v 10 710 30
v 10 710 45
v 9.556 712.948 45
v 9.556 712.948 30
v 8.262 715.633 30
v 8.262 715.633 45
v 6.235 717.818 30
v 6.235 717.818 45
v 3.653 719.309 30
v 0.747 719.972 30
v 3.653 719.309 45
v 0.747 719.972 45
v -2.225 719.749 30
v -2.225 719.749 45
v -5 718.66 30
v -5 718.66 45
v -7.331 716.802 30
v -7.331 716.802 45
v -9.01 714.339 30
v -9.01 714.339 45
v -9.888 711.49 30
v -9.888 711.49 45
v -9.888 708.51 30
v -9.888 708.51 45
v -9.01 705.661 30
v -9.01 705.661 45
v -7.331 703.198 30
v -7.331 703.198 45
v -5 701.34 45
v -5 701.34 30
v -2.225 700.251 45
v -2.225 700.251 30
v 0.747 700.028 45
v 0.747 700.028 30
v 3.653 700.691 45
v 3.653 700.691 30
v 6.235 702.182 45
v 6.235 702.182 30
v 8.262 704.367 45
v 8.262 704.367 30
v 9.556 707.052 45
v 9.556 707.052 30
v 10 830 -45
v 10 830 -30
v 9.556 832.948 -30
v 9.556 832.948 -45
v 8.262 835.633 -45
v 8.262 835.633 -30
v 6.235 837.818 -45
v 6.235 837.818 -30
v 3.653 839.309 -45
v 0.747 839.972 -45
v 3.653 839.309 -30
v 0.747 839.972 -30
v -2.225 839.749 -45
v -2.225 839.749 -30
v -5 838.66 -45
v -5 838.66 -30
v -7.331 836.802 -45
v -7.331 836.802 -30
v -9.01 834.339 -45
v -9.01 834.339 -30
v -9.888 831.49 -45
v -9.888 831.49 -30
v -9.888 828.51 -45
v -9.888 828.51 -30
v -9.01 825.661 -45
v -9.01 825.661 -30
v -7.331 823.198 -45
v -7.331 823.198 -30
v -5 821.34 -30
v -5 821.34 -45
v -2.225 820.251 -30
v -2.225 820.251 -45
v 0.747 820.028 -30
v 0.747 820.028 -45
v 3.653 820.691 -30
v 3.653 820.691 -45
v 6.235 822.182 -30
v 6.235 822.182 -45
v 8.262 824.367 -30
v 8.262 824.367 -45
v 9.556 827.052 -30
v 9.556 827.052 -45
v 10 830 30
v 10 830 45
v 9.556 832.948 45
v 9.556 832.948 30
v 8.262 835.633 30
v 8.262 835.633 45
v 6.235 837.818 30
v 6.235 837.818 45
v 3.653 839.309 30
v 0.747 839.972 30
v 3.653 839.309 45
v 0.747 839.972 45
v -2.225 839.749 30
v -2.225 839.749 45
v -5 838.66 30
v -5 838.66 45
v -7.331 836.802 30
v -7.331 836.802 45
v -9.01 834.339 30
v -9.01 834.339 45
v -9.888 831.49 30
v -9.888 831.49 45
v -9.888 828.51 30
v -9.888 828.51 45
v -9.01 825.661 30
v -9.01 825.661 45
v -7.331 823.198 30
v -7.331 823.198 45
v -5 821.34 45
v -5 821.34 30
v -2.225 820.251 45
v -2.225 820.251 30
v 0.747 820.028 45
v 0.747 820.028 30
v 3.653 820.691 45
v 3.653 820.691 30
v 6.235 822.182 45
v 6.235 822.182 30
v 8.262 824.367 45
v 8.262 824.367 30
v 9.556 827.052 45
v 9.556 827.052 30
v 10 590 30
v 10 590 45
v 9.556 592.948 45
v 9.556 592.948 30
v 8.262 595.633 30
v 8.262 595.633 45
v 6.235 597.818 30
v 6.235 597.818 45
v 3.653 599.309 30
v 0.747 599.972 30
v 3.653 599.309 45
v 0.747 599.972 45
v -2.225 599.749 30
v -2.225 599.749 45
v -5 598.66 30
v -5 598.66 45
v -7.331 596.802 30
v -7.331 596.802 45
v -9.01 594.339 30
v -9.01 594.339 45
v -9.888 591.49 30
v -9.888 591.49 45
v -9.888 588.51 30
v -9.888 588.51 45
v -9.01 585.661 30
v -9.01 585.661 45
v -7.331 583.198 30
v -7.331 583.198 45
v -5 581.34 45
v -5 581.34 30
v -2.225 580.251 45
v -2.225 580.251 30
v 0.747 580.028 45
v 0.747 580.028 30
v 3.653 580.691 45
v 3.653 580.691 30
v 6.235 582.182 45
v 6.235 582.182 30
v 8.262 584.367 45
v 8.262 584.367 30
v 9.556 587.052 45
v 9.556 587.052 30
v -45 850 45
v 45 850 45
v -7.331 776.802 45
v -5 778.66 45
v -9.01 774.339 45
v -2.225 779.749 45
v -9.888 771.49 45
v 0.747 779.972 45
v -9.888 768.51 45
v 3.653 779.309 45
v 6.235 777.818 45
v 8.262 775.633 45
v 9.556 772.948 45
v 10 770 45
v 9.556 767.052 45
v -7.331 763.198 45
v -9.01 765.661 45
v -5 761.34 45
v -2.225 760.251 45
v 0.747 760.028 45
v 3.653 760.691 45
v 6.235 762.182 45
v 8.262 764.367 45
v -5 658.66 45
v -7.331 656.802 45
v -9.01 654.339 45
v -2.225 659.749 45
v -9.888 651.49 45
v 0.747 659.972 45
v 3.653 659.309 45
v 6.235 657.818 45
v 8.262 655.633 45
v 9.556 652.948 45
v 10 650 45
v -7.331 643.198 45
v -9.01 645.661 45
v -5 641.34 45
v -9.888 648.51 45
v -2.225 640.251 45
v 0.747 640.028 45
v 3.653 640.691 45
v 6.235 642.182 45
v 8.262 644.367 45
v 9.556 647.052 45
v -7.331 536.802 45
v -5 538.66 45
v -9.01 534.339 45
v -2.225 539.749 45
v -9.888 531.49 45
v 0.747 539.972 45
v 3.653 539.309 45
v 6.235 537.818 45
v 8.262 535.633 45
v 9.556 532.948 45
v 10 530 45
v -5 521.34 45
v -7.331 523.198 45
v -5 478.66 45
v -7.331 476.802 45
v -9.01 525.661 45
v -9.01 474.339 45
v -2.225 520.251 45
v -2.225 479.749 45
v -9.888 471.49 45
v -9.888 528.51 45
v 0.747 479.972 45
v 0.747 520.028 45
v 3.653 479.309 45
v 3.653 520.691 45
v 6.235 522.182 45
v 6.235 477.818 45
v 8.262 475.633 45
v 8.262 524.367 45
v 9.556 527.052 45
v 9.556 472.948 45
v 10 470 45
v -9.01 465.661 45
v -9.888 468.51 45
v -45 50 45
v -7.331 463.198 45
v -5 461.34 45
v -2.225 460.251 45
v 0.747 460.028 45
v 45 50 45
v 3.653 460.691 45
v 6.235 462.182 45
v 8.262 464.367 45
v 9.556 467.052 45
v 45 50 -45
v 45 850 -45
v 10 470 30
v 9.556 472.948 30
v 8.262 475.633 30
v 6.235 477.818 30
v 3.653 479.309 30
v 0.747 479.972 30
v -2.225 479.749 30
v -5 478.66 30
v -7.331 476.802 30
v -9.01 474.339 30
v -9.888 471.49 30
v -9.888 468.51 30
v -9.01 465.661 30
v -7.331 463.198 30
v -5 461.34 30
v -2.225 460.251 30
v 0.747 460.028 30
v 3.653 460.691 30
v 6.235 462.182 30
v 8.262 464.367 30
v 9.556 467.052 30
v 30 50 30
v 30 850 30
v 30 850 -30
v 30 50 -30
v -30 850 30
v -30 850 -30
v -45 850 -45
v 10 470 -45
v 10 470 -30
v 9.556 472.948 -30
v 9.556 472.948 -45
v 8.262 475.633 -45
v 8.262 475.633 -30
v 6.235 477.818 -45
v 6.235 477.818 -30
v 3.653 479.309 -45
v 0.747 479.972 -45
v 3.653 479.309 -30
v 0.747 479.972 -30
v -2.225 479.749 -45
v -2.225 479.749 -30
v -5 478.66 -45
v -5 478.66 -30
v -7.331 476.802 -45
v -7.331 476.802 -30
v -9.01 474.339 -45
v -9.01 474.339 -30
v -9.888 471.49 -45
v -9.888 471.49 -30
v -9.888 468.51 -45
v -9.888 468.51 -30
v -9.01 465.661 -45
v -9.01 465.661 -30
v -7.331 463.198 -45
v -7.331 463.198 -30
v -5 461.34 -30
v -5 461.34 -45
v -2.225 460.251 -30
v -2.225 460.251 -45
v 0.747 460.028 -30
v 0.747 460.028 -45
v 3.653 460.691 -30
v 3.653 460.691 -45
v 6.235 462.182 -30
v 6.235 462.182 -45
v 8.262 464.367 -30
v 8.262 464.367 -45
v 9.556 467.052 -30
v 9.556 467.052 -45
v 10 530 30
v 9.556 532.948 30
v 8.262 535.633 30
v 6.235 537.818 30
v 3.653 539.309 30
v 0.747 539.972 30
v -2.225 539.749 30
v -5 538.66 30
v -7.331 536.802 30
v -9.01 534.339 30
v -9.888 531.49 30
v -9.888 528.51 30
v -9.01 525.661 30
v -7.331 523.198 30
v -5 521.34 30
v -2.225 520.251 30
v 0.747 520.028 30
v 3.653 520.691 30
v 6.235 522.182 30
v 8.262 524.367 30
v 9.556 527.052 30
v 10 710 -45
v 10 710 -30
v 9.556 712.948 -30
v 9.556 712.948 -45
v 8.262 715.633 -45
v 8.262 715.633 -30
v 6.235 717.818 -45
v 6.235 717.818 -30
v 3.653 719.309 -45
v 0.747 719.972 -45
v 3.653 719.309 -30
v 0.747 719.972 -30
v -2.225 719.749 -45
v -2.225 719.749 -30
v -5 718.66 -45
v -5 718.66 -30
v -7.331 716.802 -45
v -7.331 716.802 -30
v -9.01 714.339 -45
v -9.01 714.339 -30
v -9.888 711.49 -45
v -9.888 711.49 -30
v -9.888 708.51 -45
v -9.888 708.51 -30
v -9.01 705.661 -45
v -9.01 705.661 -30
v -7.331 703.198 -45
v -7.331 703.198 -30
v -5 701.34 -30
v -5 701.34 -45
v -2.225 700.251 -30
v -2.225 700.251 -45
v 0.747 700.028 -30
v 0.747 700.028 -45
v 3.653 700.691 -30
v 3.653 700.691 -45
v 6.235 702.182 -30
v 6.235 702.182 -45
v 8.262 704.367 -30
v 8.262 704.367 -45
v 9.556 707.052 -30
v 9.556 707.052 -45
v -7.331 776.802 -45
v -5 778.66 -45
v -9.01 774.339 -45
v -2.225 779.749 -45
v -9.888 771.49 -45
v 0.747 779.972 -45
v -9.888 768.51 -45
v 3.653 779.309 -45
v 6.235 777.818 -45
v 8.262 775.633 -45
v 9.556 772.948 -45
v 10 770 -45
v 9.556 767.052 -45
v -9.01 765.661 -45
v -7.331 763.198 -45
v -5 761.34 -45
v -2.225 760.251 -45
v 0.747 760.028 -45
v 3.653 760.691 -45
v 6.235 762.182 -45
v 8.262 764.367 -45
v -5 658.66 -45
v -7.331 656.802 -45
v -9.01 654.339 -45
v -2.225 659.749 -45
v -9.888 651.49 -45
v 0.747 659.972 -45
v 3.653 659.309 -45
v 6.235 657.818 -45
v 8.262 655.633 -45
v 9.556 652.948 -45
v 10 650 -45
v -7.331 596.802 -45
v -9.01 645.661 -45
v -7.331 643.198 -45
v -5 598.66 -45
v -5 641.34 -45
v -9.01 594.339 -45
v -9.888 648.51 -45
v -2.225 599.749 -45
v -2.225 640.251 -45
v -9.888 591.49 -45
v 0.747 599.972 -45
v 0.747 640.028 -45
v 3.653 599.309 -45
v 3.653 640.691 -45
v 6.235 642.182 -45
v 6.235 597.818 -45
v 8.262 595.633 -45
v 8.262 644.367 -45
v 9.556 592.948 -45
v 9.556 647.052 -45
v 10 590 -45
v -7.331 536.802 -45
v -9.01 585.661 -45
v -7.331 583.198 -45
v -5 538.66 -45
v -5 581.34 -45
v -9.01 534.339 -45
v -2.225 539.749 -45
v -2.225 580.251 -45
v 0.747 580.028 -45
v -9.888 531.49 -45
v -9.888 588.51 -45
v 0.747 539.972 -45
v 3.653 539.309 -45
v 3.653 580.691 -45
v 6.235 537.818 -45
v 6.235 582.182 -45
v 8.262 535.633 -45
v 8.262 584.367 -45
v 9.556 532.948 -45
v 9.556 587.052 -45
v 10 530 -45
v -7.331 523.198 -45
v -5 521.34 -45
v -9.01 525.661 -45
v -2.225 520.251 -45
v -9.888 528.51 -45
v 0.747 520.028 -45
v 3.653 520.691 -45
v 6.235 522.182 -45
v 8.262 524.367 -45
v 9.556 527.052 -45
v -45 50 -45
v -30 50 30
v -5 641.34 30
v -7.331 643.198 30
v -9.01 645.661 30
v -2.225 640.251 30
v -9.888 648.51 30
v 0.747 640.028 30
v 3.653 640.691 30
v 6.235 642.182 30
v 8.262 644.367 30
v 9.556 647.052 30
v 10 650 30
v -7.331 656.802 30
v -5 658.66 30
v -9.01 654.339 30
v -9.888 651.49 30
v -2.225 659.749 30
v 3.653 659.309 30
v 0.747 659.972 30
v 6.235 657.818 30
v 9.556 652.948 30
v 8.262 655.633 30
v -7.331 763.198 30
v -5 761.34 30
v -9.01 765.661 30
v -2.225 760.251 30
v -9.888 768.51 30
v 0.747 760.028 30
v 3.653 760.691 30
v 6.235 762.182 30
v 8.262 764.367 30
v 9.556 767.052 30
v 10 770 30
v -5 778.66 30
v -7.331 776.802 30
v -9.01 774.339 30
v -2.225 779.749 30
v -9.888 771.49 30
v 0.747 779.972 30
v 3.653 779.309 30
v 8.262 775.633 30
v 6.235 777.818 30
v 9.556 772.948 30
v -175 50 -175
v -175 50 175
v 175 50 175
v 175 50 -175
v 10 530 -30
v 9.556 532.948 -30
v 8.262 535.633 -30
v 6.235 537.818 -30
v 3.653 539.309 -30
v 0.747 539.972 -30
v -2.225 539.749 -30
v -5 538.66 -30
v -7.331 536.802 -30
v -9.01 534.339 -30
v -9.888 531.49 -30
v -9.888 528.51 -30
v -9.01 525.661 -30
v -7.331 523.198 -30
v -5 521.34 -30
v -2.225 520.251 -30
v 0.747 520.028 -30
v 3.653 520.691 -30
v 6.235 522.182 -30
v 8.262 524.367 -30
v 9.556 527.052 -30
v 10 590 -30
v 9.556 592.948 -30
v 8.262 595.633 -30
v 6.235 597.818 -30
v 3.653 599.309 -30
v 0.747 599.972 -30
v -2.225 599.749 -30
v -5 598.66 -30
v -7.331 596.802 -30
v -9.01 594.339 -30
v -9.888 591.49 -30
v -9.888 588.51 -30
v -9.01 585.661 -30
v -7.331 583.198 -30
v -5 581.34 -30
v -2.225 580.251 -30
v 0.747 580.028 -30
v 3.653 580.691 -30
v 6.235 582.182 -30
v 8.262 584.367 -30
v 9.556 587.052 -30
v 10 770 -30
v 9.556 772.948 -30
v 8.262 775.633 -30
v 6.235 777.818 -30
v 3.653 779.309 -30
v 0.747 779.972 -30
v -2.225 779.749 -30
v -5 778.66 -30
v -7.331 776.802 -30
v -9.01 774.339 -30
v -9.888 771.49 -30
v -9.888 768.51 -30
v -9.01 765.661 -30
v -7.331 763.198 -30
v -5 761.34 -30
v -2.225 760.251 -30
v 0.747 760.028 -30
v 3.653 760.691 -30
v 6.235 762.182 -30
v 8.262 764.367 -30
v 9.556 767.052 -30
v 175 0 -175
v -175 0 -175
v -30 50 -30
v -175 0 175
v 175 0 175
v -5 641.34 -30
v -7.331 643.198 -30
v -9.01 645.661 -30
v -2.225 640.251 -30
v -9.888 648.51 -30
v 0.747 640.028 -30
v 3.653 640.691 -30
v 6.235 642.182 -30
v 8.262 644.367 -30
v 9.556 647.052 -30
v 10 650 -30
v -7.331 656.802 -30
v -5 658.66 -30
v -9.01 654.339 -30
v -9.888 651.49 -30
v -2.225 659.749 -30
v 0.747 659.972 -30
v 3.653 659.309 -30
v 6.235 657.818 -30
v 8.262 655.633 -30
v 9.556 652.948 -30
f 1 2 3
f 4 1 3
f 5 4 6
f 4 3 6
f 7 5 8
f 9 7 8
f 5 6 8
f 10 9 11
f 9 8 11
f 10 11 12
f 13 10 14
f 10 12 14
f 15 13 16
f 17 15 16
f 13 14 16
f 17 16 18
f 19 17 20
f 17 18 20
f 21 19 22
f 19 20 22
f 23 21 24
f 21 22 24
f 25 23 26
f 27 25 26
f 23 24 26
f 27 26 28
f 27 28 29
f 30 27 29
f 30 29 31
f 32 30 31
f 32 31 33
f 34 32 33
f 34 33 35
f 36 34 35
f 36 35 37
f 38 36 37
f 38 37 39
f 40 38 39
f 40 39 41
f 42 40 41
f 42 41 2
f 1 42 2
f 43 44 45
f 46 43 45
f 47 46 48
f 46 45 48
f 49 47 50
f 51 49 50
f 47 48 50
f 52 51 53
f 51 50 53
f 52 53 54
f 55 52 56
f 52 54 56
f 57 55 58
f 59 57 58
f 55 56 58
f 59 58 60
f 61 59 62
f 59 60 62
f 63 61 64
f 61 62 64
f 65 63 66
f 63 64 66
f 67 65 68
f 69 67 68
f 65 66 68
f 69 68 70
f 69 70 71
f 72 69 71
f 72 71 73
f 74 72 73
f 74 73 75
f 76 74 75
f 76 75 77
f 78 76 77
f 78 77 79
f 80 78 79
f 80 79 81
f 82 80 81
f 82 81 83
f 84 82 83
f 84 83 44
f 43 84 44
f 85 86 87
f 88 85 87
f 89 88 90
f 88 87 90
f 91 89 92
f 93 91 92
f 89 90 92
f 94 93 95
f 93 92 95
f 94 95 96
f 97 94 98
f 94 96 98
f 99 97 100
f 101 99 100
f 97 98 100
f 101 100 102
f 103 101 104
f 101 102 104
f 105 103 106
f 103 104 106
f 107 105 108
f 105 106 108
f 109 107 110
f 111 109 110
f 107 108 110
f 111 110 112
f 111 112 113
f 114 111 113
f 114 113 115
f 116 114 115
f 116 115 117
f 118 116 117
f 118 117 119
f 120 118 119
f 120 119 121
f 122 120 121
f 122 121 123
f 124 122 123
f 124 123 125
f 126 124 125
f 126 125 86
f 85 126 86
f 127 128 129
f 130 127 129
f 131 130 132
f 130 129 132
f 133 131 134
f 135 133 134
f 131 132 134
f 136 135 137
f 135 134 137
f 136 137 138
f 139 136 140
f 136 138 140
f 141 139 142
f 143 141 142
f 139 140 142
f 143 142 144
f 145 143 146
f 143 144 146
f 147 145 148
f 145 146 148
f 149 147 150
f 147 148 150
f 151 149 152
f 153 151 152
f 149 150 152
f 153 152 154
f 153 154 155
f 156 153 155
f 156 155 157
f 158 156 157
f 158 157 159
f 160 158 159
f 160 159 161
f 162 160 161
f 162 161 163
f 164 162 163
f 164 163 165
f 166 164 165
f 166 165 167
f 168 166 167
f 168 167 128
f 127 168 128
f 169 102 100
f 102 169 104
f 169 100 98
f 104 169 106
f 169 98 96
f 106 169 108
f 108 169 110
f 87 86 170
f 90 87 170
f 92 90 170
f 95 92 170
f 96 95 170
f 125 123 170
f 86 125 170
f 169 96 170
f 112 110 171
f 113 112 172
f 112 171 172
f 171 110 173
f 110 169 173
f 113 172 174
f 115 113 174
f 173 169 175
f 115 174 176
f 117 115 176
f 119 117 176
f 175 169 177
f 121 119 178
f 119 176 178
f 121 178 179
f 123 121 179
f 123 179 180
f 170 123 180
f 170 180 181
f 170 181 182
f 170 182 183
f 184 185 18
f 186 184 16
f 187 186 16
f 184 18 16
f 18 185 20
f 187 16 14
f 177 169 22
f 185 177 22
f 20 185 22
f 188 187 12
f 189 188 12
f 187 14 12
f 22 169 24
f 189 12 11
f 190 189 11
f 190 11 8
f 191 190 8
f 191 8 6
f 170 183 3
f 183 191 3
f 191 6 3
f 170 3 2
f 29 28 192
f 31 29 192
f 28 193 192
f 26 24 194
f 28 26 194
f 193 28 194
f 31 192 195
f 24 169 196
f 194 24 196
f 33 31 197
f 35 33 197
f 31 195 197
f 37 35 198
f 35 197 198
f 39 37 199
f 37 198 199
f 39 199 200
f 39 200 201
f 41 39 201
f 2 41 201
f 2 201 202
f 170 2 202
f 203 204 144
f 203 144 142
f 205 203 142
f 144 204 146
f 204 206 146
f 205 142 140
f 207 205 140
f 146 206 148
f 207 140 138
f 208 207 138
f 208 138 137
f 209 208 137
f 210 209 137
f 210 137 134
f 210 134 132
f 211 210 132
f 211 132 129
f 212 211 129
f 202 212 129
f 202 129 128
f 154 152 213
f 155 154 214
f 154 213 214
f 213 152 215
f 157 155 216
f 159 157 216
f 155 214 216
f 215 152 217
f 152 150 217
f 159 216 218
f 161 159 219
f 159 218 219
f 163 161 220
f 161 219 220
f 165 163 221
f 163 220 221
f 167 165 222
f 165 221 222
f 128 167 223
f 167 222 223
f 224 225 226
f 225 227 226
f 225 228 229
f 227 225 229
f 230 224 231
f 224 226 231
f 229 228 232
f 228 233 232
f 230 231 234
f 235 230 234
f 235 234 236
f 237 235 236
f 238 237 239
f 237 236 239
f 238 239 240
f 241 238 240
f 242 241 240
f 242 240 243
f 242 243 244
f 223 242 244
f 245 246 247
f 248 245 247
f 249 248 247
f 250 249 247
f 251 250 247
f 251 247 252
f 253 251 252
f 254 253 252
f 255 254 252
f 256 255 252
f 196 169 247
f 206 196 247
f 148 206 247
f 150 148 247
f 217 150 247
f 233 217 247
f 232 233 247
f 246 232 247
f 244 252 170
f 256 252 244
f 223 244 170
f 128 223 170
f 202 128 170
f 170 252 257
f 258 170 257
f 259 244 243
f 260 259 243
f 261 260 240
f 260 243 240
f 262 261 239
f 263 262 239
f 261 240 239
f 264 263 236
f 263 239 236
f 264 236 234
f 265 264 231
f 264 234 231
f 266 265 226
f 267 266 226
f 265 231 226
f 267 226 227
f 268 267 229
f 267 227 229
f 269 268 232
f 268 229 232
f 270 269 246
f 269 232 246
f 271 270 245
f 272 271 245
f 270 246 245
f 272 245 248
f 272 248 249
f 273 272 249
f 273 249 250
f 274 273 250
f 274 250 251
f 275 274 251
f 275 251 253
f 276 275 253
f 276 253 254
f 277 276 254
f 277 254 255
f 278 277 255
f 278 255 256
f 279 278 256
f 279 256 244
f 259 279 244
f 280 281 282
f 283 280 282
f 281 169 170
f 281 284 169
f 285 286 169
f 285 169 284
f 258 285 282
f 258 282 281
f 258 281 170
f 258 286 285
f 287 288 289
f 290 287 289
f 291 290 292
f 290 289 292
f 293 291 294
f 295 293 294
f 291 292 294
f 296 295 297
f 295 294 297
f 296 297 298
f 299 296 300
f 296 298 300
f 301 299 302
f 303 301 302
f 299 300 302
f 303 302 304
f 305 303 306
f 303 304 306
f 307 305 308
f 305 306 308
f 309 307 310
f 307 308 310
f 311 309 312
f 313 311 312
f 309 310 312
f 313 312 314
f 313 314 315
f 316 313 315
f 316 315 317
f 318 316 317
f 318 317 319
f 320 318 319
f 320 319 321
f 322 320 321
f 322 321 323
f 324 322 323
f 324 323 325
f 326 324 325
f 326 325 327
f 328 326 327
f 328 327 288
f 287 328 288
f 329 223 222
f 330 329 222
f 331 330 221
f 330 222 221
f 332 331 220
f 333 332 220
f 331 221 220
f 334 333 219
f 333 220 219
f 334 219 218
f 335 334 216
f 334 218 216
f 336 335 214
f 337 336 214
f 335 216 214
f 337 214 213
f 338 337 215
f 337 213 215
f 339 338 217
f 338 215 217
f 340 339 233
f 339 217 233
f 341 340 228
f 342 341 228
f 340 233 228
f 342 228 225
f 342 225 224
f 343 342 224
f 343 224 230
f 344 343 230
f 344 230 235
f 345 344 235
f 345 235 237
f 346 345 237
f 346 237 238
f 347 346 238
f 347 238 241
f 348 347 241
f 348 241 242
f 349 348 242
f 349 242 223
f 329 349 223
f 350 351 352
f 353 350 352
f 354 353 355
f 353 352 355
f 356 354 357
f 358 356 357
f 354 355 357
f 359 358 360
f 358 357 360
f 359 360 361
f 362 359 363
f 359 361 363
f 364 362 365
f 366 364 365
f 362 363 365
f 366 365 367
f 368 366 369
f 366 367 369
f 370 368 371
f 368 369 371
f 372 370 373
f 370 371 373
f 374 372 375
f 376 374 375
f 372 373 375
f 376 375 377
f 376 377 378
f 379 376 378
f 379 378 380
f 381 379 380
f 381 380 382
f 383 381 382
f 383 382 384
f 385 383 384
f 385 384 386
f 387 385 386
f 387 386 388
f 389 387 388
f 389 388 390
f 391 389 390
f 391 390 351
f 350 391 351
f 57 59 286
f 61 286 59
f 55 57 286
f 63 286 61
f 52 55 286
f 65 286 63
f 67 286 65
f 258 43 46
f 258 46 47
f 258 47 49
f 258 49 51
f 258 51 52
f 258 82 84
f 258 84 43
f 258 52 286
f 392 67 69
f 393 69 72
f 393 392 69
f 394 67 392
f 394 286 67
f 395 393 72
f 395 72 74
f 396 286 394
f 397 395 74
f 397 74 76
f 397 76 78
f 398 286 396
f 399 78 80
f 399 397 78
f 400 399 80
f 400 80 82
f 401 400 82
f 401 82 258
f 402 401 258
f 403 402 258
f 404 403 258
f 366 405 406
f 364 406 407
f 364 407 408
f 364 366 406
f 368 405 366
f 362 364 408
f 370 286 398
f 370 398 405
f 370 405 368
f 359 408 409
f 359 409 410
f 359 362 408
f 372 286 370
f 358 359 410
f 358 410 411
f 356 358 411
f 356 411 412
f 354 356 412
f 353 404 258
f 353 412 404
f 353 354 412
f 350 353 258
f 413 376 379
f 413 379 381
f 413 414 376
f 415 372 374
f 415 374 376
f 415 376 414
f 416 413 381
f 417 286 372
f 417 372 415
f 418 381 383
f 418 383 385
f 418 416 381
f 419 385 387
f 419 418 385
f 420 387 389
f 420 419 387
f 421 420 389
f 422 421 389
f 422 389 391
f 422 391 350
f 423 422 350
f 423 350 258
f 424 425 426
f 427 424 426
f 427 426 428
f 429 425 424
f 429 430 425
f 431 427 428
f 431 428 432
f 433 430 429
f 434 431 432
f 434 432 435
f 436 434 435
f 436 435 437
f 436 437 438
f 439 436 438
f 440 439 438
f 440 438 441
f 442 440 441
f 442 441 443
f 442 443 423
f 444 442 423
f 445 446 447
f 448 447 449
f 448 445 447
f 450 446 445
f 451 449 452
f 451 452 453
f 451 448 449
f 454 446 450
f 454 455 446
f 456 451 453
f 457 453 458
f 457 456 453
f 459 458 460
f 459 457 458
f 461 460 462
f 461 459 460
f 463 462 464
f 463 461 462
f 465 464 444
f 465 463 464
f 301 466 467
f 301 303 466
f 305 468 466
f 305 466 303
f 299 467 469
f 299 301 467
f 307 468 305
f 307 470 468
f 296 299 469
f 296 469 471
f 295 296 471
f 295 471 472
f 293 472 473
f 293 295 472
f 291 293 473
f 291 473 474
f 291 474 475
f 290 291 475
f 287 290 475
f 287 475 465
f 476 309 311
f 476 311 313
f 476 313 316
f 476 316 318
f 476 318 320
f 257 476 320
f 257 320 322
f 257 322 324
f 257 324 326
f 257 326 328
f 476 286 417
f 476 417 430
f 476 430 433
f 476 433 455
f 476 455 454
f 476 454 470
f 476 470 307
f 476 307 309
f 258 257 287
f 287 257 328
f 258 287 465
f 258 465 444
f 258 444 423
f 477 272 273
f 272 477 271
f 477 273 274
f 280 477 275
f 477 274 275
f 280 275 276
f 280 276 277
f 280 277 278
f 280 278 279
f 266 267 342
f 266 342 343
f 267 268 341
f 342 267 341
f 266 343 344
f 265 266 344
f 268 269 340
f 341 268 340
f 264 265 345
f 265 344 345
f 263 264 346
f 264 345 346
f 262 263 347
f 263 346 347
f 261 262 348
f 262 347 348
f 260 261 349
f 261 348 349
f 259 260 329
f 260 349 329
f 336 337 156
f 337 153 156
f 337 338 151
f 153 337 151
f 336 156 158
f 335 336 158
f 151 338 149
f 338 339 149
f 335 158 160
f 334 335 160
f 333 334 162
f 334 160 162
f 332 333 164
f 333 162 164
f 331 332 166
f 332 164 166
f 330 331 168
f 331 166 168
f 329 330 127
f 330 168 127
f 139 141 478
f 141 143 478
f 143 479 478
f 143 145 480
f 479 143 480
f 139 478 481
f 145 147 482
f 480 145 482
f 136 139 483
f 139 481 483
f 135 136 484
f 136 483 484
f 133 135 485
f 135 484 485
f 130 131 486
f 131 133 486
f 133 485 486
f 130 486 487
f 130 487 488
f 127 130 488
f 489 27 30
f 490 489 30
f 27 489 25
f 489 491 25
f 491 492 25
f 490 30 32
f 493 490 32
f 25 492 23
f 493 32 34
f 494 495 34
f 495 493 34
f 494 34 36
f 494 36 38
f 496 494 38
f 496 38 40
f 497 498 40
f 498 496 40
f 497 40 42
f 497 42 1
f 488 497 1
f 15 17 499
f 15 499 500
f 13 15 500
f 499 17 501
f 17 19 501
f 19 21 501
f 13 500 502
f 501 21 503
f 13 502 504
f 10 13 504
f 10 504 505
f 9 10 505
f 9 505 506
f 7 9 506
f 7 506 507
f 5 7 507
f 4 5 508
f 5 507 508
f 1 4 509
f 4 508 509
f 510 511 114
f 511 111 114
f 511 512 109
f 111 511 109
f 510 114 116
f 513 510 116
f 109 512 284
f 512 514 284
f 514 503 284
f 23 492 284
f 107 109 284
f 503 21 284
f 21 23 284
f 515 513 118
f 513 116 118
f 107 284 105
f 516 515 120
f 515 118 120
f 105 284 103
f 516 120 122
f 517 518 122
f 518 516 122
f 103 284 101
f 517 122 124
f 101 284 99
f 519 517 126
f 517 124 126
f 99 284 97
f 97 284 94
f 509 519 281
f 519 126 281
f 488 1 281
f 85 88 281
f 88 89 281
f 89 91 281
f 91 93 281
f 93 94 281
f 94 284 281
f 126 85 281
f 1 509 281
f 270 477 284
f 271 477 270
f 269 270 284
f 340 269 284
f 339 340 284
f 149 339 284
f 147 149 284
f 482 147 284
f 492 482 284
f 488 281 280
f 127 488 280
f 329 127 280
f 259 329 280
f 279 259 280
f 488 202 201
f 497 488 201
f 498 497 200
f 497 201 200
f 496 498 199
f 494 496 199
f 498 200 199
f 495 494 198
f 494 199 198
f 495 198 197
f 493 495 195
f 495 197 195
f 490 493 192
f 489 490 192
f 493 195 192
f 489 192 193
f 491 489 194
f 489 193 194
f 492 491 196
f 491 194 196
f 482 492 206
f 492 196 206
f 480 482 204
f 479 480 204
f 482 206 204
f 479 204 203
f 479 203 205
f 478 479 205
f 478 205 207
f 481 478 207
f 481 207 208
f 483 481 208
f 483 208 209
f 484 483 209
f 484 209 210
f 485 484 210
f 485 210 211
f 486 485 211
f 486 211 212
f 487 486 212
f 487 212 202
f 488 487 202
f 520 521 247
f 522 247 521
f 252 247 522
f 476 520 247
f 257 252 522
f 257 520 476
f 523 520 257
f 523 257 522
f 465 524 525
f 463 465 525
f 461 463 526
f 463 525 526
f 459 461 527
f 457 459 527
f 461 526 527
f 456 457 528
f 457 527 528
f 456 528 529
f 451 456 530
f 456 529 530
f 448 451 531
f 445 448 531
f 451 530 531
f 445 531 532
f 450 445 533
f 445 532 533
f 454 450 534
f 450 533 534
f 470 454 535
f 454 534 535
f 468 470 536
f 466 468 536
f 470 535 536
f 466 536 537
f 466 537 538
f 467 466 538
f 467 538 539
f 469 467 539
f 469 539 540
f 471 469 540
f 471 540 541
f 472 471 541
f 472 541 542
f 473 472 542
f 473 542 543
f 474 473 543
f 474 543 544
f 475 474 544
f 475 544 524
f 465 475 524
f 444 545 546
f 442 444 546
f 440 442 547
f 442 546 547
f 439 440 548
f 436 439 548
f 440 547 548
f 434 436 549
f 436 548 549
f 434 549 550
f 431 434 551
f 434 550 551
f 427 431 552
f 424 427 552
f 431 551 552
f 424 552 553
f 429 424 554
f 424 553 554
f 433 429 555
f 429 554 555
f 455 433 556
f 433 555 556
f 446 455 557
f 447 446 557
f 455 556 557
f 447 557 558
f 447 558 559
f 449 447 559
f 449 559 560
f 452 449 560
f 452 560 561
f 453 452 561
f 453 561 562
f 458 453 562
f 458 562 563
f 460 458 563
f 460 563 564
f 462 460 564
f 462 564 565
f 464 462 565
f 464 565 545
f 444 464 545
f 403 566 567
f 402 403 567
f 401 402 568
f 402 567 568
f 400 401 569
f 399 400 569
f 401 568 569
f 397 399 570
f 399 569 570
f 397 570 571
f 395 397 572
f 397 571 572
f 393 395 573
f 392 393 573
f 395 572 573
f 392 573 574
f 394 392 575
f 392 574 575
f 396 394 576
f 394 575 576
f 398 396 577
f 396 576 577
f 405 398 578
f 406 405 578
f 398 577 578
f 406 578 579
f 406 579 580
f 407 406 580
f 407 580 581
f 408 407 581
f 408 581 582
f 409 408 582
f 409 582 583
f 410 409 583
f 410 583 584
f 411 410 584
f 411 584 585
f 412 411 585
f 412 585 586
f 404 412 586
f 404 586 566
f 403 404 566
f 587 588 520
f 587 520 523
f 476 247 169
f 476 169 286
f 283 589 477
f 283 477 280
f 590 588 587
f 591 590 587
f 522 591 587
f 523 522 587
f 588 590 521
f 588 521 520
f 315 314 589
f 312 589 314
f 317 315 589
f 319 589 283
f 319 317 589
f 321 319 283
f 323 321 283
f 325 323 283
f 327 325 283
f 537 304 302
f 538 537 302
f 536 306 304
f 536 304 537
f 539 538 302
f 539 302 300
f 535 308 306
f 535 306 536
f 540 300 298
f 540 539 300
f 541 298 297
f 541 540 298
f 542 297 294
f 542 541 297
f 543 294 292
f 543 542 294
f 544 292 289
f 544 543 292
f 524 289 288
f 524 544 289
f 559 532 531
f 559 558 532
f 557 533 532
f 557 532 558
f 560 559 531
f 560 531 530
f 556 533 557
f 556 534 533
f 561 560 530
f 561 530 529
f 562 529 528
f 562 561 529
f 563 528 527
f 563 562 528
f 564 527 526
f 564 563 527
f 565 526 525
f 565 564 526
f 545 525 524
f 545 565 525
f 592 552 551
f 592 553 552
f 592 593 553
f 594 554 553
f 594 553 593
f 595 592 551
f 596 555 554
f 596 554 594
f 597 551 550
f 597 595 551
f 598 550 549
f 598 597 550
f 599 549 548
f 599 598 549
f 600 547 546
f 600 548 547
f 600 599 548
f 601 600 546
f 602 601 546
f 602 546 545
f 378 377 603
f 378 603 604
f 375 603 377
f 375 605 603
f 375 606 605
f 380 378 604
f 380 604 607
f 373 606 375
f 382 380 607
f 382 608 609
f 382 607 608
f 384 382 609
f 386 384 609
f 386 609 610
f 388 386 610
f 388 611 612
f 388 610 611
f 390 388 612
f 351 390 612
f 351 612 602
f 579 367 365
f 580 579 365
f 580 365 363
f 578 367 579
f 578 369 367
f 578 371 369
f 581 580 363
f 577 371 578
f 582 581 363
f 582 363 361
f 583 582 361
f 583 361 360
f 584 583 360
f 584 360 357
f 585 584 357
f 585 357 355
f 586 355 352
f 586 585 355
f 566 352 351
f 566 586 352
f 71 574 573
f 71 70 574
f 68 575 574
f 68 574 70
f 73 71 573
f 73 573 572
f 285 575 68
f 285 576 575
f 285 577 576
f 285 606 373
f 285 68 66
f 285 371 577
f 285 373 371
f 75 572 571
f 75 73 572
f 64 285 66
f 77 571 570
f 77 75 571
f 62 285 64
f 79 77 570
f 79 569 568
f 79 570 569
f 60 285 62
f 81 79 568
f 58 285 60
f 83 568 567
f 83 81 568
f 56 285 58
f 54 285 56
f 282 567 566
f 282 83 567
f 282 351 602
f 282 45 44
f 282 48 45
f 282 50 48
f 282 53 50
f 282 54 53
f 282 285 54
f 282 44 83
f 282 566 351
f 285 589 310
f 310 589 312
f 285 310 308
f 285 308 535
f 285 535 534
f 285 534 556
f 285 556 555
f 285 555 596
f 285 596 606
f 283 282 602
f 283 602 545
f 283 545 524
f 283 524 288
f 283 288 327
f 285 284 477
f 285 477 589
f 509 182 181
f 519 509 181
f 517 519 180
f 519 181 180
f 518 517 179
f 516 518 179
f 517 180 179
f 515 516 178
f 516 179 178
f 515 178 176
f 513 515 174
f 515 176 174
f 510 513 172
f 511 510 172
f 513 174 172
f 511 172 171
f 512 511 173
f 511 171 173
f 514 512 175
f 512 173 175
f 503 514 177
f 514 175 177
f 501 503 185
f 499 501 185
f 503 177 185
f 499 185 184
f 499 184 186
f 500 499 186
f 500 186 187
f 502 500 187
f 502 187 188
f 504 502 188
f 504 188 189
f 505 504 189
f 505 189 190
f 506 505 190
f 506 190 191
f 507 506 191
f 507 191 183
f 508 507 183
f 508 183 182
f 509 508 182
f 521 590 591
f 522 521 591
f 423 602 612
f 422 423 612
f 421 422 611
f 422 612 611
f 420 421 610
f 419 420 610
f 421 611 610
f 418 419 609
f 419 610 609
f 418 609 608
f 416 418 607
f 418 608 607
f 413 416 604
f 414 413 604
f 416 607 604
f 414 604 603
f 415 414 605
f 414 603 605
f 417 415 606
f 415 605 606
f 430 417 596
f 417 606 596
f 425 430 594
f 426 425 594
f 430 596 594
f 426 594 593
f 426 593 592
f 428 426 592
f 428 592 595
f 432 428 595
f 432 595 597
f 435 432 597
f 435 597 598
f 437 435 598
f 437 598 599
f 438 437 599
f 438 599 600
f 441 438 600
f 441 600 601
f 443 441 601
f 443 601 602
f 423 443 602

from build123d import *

# Parameters (mm, degrees)
SKETCH1_W           = 350
SKETCH1_H           = 350
BOSS_EXTRUDE1_DEPTH = 50
SKETCH2_W           = 90
SKETCH2_H           = 90
BOSS_EXTRUDE2_DEPTH = 800
SKETCH3_W           = 60
SKETCH3_H           = 60
CUT_EXTRUDE1_DEPTH  = 800
SKETCH4_R           = 10
CUT_EXTRUDE3_DEPTH  = 221


with BuildPart() as part:
    # Sketch1 → Boss-Extrude1 (new body)
    with BuildSketch(Plane(origin=(0, 0, 0), x_dir=(1, 0, 0), z_dir=(0, 1, 0))):
        Rectangle(SKETCH1_W, SKETCH1_H)
    extrude(amount=BOSS_EXTRUDE1_DEPTH)

    # Sketch2 → Boss-Extrude2 (add)
    with BuildSketch(Plane(origin=(0, 50, 0), x_dir=(1, 0, 0), z_dir=(0, 1, 0))):
        Rectangle(SKETCH2_W, SKETCH2_H)
    extrude(amount=BOSS_EXTRUDE2_DEPTH)

    # Sketch3 → Cut-Extrude1 (cut)
    with BuildSketch(Plane(origin=(0, 850, 0), x_dir=(1, 0, 0), z_dir=(0, 1, 0))):
        Rectangle(SKETCH3_W, SKETCH3_H)
    extrude(amount=-CUT_EXTRUDE1_DEPTH, mode=Mode.SUBTRACT)

    # Sketch4 → Cut-Extrude3 (cut, through all)
    with BuildSketch(Plane.XY.offset(45)):
        with Locations((0, 830)):
            Circle(SKETCH4_R)
        with Locations((0, 770)):
            Circle(SKETCH4_R)
        with Locations((0, 710)):
            Circle(SKETCH4_R)
        with Locations((0, 650)):
            Circle(SKETCH4_R)
        with Locations((0, 590)):
            Circle(SKETCH4_R)
        with Locations((0, 530)):
            Circle(SKETCH4_R)
        with Locations((0, 470)):
            Circle(SKETCH4_R)
    extrude(amount=-CUT_EXTRUDE3_DEPTH, mode=Mode.SUBTRACT)


solid = part.part
